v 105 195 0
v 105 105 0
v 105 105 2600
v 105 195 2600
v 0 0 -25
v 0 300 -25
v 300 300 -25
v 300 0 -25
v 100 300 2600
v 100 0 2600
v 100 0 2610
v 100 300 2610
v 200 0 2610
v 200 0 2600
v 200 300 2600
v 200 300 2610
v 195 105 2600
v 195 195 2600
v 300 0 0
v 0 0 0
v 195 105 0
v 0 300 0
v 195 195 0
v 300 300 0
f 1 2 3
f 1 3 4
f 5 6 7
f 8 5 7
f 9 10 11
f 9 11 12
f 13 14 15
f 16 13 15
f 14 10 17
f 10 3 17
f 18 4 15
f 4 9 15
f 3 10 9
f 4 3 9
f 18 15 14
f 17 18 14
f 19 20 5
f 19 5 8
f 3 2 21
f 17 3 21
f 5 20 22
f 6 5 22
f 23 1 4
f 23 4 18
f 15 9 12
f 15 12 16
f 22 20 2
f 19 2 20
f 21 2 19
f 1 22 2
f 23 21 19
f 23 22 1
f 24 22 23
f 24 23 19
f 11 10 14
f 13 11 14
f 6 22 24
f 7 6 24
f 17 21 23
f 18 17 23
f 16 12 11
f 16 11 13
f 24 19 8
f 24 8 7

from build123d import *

# Parameters (mm, degrees)
F0_W     = 300
F0_H     = 300
F0_W_2   = 90
F0_H_2   = 90
F1_DEPTH = 25
F2_DEPTH = 2600
F3_W     = 100
F3_H     = 300
F4_DEPTH = 10


with BuildPart() as f1:
    # F0 (on Top) → F1 (new body)
    with BuildSketch(Plane.XY):
        with Locations((150, 150)):
            Rectangle(F0_W, F0_H)
        with Locations((150, 150)):
            Rectangle(F0_W_2, F0_H_2, mode=Mode.SUBTRACT)
        with Locations((150, 150)):
            Rectangle(F0_W_2, F0_H_2)
    extrude(amount=-F1_DEPTH)

    # F0 (on Top) → F2 (join)
    with BuildSketch(Plane.XY):
        with Locations((150, 150)):
            Rectangle(F0_W_2, F0_H_2)
    extrude(amount=F2_DEPTH)

    # F3 (on face) → F4 (join)
    with BuildSketch(Plane.XY.offset(2600)):
        with Locations((150, 150)):
            Rectangle(F3_W, F3_H)
    extrude(amount=F4_DEPTH)


solid = f1.part
